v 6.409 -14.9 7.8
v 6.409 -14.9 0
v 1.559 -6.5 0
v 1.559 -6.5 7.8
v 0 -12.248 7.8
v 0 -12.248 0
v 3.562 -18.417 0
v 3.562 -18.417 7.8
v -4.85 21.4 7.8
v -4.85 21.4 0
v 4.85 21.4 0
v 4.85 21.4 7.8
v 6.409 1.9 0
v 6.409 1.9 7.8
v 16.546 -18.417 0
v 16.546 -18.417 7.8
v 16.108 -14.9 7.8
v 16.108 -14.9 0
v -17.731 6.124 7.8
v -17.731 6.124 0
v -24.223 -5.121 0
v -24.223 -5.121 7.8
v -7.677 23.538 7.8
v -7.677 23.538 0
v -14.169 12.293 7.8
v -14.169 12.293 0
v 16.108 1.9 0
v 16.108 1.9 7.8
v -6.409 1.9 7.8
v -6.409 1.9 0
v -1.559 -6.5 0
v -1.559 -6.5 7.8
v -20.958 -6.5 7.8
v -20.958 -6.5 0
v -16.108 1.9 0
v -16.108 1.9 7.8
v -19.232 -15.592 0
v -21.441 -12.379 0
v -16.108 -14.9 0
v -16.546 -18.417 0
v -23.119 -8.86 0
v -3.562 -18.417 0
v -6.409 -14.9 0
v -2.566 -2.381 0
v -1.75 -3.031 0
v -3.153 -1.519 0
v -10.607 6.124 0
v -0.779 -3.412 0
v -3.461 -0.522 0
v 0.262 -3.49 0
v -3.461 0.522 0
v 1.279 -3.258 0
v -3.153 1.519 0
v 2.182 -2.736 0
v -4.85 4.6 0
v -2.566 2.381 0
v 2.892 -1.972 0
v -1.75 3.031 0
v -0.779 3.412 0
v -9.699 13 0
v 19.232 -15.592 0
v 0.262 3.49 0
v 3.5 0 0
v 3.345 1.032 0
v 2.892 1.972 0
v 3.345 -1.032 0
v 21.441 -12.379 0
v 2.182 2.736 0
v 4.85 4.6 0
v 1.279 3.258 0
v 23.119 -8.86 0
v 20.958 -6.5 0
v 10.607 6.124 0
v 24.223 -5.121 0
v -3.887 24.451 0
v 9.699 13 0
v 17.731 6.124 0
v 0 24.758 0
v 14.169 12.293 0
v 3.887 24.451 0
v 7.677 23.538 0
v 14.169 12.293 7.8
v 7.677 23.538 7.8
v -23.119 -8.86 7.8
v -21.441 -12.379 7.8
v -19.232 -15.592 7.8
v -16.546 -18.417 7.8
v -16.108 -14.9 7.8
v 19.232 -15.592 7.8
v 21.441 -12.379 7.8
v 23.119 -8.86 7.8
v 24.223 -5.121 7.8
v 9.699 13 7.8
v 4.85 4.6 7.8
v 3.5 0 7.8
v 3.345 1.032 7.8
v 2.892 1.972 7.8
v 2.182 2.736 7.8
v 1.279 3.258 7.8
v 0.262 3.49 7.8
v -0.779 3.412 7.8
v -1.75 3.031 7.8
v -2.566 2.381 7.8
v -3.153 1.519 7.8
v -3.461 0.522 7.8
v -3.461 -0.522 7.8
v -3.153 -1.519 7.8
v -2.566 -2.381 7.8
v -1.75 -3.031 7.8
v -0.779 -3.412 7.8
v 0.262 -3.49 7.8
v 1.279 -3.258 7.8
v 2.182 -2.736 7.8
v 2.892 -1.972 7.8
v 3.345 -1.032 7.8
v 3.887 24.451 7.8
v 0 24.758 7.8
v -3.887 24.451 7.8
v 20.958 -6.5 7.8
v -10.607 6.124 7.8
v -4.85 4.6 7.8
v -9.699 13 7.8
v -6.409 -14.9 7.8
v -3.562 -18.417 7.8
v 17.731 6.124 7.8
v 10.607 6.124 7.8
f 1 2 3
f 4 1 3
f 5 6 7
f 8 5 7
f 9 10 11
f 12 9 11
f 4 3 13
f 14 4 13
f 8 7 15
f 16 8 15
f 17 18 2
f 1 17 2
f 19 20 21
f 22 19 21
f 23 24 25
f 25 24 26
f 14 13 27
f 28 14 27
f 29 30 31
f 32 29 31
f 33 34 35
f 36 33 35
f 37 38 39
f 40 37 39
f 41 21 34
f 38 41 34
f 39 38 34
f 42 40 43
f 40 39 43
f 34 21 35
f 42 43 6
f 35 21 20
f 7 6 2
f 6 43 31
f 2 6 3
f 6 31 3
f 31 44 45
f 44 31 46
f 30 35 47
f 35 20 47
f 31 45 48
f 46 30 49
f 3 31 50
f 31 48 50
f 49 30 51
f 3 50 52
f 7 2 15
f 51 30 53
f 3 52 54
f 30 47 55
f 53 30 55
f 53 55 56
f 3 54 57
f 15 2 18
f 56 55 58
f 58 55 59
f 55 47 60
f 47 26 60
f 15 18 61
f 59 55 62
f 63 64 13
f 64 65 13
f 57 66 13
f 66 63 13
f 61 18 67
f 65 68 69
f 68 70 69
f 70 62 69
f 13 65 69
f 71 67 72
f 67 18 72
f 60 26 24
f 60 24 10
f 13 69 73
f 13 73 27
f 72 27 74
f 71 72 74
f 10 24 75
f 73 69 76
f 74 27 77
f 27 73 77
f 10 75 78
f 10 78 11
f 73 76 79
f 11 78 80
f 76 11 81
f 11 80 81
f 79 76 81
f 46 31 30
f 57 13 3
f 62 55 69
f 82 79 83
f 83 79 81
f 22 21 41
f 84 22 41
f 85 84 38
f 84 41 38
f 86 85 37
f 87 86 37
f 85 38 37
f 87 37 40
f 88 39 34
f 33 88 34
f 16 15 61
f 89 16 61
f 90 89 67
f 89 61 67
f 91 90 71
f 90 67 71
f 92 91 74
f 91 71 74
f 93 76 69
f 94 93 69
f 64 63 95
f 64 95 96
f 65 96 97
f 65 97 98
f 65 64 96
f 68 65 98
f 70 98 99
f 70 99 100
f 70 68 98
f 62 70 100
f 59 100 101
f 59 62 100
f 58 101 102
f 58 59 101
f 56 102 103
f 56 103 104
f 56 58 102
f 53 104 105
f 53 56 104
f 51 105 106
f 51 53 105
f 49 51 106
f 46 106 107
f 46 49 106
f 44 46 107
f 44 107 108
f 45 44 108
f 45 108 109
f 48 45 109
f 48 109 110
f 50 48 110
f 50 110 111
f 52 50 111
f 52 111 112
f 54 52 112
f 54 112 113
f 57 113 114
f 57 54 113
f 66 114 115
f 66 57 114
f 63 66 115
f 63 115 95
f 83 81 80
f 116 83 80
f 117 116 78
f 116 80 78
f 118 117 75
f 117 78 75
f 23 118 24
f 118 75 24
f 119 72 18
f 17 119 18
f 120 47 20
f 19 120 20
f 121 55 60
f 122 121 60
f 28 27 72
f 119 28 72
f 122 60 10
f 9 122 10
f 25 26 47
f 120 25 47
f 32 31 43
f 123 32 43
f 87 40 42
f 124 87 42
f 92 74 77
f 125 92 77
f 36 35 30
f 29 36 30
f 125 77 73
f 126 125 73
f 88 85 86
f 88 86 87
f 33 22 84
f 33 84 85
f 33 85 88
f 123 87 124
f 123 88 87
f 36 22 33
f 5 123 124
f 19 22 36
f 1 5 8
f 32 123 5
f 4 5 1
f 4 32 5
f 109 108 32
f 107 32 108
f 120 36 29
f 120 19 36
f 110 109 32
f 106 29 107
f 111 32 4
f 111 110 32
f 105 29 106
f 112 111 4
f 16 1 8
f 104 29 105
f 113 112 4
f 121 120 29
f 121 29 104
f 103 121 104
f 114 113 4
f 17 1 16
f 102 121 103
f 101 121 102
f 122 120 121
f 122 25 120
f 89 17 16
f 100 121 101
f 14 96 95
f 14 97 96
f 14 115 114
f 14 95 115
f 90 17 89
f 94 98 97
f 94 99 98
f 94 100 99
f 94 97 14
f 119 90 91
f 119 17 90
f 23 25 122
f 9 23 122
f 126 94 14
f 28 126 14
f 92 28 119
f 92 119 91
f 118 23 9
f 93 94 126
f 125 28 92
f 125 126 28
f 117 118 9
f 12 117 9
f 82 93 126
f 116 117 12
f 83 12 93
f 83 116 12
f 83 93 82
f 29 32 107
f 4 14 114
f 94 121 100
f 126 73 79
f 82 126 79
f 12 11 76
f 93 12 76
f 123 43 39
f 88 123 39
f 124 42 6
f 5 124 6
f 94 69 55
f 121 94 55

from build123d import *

# Parameters (mm, degrees)
F0_R     = 3.5
F1_DEPTH = 7.8


# Not quite as in the source:
# - the program builds the solid bodies; features that only make, move or delete a surface that nothing else refers to are left out


with BuildPart() as f1:
    # F0 (on Top) → F1 (new body)
    with BuildSketch(Plane.XY):
        with BuildLine():
            ThreePointArc((16.5459263903, -18.417339772), (21.4411884767, -12.3790759388), (24.2228473078, -5.1205226972))
            Line((24.2228473078, -5.1205226972), (17.7308233658, 6.1239926144))
            Line((17.7308233658, 6.1239926144), (10.6070663534, 6.1239926144))
            Line((10.6070663534, 6.1239926144), (14.1689448596, 12.2933471575))
            Line((14.1689448596, 12.2933471575), (7.6769209175, 23.5378624692))
            ThreePointArc((7.6769209175, 23.5378624692), (0, 24.7581518775), (-7.6769209175, 23.5378624692))
            Line((-7.6769209175, 23.5378624692), (-14.1689448596, 12.2933471575))
            Line((-14.1689448596, 12.2933471575), (-10.6070663534, 6.1239926144))
            Line((-10.6070663534, 6.1239926144), (-17.7308233658, 6.1239926144))
            Line((-17.7308233658, 6.1239926144), (-24.2228473078, -5.1205226972))
            ThreePointArc((-24.2228473078, -5.1205226972), (-21.4411884767, -12.3790759388), (-16.5459263903, -18.417339772))
            Line((-16.5459263903, -18.417339772), (-3.5618785062, -18.417339772))
            Line((-3.5618785062, -18.417339772), (0, -12.2479852289))
            Line((0, -12.2479852289), (3.5618785062, -18.417339772))
            Line((3.5618785062, -18.417339772), (16.5459263903, -18.417339772))
        make_face()
        Polygon((-6.408587988, -14.9), (-16.1080725104, -14.9), (-20.9578147716, -6.5), (-16.1080725104, 1.9), (-6.408587988, 1.9), (-1.5588457268, -6.5), align=None, mode=Mode.SUBTRACT)
        Polygon((16.1080725104, 1.9), (20.9578147716, -6.5), (16.1080725104, -14.9), (6.408587988, -14.9), (1.5588457268, -6.5), (6.408587988, 1.9), align=None, mode=Mode.SUBTRACT)
        Circle(F0_R, mode=Mode.SUBTRACT)
        Polygon((9.6994845224, 13), (4.8497422612, 4.6), (-4.8497422612, 4.6), (-9.6994845224, 13), (-4.8497422612, 21.4), (4.8497422612, 21.4), align=None, mode=Mode.SUBTRACT)
    extrude(amount=F1_DEPTH)


solid = f1.part
